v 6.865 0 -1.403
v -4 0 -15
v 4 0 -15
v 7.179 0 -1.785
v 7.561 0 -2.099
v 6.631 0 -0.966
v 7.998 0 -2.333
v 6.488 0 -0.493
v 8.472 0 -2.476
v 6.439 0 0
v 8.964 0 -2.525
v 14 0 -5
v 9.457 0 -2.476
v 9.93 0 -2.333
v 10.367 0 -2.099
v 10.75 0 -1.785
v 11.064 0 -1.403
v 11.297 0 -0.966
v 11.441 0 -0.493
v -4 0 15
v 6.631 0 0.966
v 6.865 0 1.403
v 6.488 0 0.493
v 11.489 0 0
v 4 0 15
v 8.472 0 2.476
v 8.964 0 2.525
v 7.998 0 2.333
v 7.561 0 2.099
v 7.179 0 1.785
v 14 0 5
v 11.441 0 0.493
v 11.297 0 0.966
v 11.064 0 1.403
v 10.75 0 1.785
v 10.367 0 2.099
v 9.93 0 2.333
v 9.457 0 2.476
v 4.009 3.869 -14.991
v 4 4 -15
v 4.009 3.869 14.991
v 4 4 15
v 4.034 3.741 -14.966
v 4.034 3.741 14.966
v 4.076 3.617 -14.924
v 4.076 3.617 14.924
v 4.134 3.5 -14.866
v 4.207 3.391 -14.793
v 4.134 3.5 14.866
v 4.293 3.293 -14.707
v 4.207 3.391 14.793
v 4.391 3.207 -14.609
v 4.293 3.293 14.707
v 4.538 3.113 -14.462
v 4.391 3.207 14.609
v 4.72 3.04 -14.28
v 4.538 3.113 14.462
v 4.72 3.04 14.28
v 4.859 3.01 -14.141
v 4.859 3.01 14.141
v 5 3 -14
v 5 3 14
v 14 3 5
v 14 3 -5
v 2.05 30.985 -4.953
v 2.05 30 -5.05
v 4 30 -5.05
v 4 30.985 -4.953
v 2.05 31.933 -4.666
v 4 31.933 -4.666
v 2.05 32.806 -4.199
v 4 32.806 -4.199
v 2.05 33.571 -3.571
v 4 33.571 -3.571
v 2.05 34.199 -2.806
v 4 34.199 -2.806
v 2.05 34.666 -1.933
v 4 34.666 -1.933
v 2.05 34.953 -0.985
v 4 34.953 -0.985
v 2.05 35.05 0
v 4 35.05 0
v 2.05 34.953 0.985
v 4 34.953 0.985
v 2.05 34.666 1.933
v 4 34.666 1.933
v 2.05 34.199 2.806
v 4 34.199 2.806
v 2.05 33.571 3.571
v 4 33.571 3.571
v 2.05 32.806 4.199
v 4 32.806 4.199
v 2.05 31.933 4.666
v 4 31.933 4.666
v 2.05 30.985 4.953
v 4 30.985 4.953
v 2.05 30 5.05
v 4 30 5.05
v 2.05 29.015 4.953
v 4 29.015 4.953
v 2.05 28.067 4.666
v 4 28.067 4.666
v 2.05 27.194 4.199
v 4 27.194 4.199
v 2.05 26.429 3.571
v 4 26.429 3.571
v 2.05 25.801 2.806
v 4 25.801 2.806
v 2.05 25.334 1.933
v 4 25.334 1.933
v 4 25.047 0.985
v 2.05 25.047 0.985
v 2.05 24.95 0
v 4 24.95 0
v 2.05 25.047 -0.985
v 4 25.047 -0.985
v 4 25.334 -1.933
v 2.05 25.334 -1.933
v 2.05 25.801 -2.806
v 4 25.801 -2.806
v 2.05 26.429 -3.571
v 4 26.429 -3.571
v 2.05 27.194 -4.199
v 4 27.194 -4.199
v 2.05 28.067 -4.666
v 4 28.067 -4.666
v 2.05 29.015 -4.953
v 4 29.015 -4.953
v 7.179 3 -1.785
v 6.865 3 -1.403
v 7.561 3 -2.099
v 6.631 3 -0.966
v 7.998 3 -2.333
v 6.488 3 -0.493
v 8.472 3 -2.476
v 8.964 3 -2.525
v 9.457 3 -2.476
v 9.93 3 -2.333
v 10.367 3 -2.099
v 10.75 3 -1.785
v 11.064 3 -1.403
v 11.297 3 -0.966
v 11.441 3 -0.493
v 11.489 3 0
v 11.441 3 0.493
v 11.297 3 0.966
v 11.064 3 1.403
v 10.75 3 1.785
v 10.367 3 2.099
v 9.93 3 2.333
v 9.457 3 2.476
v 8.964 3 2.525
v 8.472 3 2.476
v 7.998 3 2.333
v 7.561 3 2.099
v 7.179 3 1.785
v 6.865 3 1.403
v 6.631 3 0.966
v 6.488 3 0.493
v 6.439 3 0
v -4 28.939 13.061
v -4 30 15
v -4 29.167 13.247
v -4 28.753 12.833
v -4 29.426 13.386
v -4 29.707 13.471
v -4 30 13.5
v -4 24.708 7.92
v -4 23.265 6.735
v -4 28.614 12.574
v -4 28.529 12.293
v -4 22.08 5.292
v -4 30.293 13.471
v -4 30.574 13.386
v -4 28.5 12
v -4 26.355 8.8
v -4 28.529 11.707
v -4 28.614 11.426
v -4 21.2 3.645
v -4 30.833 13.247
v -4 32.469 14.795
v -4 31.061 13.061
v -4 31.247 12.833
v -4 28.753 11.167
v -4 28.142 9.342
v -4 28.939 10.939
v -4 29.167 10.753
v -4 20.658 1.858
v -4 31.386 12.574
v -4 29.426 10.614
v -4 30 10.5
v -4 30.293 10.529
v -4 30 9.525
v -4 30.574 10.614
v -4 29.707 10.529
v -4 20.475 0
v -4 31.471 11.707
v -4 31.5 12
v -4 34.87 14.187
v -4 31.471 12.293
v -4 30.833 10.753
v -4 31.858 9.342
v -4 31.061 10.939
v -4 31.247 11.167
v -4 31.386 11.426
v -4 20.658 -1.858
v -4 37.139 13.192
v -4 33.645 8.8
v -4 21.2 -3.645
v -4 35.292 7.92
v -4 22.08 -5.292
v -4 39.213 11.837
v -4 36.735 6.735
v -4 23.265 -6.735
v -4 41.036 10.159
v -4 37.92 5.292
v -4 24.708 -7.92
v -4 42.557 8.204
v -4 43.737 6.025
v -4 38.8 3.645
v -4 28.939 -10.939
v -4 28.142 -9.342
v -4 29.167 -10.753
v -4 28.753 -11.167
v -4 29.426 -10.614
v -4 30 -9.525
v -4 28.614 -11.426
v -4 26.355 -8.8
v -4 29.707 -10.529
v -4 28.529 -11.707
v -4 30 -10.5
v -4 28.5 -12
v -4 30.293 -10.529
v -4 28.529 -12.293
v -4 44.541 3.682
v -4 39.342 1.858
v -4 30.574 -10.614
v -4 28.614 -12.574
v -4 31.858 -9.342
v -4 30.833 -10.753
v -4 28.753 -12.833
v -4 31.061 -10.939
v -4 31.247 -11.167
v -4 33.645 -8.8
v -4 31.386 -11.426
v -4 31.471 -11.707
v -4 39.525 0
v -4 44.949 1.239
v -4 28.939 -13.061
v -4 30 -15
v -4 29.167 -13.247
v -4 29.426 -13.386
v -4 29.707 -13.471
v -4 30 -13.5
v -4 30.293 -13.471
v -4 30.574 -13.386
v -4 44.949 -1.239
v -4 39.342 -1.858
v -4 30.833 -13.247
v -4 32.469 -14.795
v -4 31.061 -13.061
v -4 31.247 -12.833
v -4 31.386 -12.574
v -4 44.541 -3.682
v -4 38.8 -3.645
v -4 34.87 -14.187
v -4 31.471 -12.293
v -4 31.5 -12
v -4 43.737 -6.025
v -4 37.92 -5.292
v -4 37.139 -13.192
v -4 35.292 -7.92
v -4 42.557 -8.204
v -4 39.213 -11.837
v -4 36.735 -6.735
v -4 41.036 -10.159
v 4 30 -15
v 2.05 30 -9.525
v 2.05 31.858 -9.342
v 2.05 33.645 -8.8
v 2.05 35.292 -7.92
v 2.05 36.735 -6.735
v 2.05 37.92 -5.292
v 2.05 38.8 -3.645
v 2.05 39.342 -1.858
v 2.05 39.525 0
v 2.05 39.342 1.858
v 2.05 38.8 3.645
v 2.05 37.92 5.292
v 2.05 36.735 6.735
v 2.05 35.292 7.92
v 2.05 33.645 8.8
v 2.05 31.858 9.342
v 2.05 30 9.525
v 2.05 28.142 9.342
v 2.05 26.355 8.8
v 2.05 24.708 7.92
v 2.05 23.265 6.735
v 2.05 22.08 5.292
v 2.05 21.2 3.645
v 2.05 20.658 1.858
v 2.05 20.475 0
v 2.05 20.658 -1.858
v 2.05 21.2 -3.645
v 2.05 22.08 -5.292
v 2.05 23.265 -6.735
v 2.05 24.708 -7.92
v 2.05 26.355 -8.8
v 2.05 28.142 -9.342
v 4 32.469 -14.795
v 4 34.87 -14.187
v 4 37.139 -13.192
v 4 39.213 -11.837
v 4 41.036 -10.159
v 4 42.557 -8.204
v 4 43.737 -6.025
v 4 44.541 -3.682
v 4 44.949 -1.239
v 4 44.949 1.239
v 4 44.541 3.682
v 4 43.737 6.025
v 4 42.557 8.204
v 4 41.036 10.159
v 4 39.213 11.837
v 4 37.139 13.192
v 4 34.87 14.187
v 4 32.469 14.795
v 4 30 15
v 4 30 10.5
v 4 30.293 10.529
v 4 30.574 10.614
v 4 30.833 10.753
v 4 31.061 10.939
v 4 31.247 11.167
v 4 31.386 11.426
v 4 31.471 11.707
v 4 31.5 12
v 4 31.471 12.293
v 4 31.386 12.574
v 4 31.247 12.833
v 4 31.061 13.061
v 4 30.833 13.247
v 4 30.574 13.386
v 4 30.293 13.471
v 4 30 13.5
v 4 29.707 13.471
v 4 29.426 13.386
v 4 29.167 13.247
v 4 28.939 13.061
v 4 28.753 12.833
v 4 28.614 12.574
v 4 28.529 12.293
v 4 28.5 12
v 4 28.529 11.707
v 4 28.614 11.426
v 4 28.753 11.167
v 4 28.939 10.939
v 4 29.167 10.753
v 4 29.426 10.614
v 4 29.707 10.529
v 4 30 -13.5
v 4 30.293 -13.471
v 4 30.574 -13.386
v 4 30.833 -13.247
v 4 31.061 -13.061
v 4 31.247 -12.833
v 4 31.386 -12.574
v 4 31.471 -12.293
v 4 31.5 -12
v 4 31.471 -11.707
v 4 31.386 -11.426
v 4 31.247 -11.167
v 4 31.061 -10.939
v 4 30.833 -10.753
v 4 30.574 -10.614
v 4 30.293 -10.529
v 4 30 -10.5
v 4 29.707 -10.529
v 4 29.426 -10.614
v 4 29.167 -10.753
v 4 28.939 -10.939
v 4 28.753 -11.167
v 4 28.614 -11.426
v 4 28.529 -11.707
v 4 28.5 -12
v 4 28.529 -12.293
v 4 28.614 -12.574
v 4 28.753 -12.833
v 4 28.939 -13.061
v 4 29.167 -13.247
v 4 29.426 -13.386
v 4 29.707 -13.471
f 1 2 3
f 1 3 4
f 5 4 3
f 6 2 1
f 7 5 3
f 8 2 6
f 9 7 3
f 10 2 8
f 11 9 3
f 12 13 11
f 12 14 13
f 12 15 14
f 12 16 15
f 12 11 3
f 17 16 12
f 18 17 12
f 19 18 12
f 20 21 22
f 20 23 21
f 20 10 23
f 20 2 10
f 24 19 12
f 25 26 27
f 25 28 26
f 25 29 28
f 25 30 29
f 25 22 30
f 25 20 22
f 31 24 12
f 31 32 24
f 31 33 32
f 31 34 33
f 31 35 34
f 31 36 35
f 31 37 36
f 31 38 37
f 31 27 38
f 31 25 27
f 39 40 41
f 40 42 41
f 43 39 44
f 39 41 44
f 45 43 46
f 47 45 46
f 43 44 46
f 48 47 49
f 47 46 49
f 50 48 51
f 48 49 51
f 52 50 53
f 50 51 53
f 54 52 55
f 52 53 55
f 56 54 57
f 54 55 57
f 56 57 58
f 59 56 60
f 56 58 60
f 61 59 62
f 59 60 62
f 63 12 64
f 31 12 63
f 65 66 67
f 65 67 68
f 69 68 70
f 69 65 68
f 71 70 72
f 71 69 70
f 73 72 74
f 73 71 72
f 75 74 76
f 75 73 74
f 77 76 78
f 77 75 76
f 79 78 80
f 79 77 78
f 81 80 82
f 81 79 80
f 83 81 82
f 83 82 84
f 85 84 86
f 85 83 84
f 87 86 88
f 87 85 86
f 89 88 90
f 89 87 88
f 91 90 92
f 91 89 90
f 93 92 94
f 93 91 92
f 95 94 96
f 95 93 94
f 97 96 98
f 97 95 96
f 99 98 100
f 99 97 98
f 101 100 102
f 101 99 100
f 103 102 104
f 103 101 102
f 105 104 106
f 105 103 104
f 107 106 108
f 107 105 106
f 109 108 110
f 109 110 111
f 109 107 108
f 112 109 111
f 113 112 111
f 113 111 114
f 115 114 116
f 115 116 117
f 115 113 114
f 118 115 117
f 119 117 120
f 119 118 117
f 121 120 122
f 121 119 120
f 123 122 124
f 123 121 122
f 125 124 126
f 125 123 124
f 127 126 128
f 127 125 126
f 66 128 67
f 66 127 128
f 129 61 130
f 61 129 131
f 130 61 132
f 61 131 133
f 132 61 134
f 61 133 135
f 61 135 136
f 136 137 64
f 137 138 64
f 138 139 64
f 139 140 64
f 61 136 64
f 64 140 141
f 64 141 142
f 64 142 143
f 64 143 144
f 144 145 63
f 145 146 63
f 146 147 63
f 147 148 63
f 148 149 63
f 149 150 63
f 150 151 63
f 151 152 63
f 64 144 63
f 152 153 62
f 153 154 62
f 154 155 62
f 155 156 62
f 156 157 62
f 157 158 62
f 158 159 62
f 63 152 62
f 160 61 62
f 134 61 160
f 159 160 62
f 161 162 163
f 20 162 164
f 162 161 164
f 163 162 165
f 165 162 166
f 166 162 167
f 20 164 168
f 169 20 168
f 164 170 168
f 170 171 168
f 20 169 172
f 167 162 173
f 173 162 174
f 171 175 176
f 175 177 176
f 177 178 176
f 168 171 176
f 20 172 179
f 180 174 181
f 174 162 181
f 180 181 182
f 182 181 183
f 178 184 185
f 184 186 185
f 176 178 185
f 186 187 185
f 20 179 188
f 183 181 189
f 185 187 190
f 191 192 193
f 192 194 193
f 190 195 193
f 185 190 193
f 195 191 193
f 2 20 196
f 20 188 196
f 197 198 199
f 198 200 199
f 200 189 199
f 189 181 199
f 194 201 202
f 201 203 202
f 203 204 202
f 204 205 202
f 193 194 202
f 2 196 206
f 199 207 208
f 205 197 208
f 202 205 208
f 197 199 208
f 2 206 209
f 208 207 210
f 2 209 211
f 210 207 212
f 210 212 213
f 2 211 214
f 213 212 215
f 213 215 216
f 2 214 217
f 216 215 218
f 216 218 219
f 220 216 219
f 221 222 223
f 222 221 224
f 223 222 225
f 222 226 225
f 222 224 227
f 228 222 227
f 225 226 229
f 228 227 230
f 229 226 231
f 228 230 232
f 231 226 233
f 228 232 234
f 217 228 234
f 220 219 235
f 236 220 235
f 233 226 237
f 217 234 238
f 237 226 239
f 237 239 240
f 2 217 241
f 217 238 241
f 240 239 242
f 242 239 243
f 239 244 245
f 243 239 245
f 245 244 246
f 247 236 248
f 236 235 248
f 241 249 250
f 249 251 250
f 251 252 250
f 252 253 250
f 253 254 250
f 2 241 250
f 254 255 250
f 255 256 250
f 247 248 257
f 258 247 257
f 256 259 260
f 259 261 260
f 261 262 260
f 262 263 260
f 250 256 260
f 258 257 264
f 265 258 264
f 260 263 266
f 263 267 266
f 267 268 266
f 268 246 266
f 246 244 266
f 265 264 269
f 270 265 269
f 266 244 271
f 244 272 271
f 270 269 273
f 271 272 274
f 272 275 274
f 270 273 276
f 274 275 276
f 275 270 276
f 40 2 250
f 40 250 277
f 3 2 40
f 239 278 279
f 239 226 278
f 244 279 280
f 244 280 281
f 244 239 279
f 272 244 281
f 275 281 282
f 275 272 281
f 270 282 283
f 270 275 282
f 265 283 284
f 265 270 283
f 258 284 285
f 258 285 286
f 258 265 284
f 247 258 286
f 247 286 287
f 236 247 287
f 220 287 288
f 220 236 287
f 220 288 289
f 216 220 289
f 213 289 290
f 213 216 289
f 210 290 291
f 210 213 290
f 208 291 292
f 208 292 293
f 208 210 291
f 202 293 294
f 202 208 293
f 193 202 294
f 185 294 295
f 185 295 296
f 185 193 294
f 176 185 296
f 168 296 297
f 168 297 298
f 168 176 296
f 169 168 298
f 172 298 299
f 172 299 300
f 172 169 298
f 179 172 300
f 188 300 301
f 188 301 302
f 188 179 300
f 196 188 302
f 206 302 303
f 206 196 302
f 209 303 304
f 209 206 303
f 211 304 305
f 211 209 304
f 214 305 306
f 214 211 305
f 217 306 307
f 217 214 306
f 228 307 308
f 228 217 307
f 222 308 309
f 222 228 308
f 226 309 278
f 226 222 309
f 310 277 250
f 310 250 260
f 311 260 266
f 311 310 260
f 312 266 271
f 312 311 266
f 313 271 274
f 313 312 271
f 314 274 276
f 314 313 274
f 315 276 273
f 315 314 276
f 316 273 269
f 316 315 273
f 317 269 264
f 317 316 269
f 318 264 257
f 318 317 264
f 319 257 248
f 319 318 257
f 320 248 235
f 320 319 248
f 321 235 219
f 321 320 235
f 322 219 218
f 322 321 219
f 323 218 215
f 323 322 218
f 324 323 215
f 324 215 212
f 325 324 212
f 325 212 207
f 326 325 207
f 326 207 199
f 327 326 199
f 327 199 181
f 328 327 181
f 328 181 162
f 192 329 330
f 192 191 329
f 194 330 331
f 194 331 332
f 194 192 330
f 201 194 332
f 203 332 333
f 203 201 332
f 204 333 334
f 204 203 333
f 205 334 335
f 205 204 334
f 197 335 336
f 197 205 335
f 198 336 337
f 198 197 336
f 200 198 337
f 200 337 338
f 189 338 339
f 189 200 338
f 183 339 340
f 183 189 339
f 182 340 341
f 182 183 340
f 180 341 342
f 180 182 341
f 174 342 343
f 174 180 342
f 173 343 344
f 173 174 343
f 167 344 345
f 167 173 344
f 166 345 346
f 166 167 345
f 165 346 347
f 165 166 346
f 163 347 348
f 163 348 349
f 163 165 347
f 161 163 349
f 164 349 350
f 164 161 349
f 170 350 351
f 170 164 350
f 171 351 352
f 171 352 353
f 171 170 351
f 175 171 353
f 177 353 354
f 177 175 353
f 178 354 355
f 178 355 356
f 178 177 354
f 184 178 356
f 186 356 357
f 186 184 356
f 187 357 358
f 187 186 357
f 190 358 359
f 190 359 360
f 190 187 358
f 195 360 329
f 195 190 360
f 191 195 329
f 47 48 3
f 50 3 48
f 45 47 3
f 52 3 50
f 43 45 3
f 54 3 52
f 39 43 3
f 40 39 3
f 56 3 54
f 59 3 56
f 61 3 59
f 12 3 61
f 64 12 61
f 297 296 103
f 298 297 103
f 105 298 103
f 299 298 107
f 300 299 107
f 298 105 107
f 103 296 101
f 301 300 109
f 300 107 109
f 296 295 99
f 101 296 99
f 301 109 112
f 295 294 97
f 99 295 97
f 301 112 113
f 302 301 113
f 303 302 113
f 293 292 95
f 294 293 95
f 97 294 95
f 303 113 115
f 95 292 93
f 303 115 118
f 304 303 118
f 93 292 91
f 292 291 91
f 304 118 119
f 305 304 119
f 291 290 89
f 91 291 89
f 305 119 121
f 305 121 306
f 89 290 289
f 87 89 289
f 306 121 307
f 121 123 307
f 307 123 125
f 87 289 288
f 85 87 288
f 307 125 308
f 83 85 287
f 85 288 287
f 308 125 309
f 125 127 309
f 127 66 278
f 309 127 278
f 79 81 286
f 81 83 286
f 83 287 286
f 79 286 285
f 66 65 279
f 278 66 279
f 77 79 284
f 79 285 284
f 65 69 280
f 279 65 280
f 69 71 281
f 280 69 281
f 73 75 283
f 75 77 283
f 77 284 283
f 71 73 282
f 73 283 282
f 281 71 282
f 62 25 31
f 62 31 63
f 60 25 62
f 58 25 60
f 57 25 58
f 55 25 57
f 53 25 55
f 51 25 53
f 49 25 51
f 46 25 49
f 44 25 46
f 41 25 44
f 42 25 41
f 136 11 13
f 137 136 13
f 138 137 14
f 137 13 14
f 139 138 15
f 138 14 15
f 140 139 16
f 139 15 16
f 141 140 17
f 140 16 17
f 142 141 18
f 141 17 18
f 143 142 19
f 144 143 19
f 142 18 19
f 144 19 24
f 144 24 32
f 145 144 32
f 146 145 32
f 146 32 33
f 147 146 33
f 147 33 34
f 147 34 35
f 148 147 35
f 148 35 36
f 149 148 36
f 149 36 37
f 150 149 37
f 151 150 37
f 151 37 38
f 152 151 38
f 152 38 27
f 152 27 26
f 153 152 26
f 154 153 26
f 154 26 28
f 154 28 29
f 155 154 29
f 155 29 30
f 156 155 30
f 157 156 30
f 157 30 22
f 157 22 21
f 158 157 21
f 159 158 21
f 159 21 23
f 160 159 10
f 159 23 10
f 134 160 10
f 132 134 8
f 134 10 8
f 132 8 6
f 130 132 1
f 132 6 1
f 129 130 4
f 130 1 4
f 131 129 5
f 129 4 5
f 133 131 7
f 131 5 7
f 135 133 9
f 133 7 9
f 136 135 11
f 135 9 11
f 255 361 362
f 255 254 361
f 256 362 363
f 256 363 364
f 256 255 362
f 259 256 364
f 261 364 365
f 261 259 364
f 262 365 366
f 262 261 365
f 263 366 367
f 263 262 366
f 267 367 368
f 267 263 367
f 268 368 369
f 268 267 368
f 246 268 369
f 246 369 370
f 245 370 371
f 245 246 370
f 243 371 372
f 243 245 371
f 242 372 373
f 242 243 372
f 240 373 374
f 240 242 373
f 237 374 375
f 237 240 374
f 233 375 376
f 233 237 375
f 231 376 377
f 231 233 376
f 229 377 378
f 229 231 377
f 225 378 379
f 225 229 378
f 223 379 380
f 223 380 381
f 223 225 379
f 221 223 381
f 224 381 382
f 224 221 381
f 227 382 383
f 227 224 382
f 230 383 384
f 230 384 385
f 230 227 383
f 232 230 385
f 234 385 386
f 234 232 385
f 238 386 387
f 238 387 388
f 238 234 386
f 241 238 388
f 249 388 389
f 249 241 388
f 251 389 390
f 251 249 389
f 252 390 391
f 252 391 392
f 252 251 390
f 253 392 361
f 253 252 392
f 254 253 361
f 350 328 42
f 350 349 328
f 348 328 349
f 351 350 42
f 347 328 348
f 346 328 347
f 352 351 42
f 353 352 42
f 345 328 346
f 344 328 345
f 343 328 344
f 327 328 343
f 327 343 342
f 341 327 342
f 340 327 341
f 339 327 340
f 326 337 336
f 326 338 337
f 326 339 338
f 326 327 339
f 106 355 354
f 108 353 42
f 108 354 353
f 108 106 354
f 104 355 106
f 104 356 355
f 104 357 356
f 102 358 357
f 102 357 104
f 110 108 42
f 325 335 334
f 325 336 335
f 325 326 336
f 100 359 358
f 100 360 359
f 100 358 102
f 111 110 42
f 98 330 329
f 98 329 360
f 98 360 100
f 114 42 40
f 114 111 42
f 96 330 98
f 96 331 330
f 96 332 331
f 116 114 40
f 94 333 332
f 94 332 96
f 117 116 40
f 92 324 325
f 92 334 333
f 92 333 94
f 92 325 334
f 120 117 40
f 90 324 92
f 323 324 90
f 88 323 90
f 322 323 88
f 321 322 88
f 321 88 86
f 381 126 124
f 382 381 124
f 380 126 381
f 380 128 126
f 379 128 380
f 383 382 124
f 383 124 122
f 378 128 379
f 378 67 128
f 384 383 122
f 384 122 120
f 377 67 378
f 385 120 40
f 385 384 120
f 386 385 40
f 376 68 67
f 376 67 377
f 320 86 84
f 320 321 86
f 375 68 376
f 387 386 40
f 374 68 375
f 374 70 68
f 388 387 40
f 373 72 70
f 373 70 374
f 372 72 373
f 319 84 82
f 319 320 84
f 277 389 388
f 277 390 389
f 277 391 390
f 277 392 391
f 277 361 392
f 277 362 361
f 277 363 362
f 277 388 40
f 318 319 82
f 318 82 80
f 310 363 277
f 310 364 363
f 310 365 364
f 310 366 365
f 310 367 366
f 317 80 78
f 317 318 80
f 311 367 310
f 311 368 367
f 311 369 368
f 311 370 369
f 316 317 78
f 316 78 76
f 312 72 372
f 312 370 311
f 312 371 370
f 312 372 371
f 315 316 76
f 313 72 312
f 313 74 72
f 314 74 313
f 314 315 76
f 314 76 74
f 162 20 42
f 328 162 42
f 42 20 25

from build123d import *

# Parameters (mm, degrees)
SKETCH2_R           = 1.5
SKETCH2_R_2         = 9.525
BOSS_EXTRUDE1_DEPTH = 4
BOSS_EXTRUDE2_START = 2.05
SKETCH2_4_R         = 9.525
SKETCH2_4_R_2       = 5.05
BOSS_EXTRUDE2_DEPTH = 1.95
SKETCH3_W           = 10
SKETCH3_H           = 30
BOSS_EXTRUDE3_DEPTH = 3
SKETCH4_R           = 2.525
CUT_EXTRUDE1_DEPTH  = 50.457052076
CHAMFER1_SIZE       = 10
FILLET2_R           = 1


with BuildPart() as part:
    # Sketch2 → Boss-Extrude1 (new, symmetric)
    with BuildSketch(Plane(origin=(0, 0, 0), x_dir=(0, 0, -1), z_dir=(1, 0, 0))):
        with BuildLine():
            Line((15, 0), (15, 30))
            ThreePointArc((15, 30), (0, 45), (-15, 30))
            Line((-15, 30), (-15, 0))
            Line((-15, 0), (15, 0))
        make_face()
        with Locations((-12, 30)):
            Circle(SKETCH2_R, mode=Mode.SUBTRACT)
        with Locations((0, 30)):
            Circle(SKETCH2_R_2, mode=Mode.SUBTRACT)
        with Locations((12, 30)):
            Circle(SKETCH2_R, mode=Mode.SUBTRACT)
    extrude(amount=BOSS_EXTRUDE1_DEPTH, both=True)

    # Sketch2<4> → Boss-Extrude2 (add)
    with BuildSketch(Plane(origin=(0, 0, 0), x_dir=(0, 0, -1), z_dir=(1, 0, 0)).offset(BOSS_EXTRUDE2_START)):
        with Locations((0, 30)):
            Circle(SKETCH2_4_R)
        with Locations((0, 30)):
            Circle(SKETCH2_4_R_2, mode=Mode.SUBTRACT)
    extrude(amount=BOSS_EXTRUDE2_DEPTH)

    # Sketch3 → Boss-Extrude3 (add)
    with BuildSketch(Plane.XZ):
        with Locations((9, 0)):
            Rectangle(SKETCH3_W, SKETCH3_H)
    extrude(amount=-BOSS_EXTRUDE3_DEPTH)

    # Sketch4 → Cut-Extrude1 (cut, through all)
    with BuildSketch(Plane(origin=(0, 0, 0), x_dir=(-1, 0, 0), z_dir=(0, -1, 0))):
        with Locations(Location((-8.964181233, 0, 0), (0, 0, 90))):
            Circle(SKETCH4_R)
    extrude(amount=-CUT_EXTRUDE1_DEPTH, mode=Mode.SUBTRACT)

    # Chamfer1
    chamfer1_edges = [part.edges().sort_by_distance(p)[0] for p in [
        (14, 1.5, -15),
        (14, 1.5, 15),
    ]]
    chamfer(chamfer1_edges, length=CHAMFER1_SIZE)

    # Fillet2
    fillet2_edges = [part.edges().sort_by_distance(p)[0] for p in [
        (4, 3, 0),
    ]]
    fillet(fillet2_edges, radius=FILLET2_R)


solid = part.part
